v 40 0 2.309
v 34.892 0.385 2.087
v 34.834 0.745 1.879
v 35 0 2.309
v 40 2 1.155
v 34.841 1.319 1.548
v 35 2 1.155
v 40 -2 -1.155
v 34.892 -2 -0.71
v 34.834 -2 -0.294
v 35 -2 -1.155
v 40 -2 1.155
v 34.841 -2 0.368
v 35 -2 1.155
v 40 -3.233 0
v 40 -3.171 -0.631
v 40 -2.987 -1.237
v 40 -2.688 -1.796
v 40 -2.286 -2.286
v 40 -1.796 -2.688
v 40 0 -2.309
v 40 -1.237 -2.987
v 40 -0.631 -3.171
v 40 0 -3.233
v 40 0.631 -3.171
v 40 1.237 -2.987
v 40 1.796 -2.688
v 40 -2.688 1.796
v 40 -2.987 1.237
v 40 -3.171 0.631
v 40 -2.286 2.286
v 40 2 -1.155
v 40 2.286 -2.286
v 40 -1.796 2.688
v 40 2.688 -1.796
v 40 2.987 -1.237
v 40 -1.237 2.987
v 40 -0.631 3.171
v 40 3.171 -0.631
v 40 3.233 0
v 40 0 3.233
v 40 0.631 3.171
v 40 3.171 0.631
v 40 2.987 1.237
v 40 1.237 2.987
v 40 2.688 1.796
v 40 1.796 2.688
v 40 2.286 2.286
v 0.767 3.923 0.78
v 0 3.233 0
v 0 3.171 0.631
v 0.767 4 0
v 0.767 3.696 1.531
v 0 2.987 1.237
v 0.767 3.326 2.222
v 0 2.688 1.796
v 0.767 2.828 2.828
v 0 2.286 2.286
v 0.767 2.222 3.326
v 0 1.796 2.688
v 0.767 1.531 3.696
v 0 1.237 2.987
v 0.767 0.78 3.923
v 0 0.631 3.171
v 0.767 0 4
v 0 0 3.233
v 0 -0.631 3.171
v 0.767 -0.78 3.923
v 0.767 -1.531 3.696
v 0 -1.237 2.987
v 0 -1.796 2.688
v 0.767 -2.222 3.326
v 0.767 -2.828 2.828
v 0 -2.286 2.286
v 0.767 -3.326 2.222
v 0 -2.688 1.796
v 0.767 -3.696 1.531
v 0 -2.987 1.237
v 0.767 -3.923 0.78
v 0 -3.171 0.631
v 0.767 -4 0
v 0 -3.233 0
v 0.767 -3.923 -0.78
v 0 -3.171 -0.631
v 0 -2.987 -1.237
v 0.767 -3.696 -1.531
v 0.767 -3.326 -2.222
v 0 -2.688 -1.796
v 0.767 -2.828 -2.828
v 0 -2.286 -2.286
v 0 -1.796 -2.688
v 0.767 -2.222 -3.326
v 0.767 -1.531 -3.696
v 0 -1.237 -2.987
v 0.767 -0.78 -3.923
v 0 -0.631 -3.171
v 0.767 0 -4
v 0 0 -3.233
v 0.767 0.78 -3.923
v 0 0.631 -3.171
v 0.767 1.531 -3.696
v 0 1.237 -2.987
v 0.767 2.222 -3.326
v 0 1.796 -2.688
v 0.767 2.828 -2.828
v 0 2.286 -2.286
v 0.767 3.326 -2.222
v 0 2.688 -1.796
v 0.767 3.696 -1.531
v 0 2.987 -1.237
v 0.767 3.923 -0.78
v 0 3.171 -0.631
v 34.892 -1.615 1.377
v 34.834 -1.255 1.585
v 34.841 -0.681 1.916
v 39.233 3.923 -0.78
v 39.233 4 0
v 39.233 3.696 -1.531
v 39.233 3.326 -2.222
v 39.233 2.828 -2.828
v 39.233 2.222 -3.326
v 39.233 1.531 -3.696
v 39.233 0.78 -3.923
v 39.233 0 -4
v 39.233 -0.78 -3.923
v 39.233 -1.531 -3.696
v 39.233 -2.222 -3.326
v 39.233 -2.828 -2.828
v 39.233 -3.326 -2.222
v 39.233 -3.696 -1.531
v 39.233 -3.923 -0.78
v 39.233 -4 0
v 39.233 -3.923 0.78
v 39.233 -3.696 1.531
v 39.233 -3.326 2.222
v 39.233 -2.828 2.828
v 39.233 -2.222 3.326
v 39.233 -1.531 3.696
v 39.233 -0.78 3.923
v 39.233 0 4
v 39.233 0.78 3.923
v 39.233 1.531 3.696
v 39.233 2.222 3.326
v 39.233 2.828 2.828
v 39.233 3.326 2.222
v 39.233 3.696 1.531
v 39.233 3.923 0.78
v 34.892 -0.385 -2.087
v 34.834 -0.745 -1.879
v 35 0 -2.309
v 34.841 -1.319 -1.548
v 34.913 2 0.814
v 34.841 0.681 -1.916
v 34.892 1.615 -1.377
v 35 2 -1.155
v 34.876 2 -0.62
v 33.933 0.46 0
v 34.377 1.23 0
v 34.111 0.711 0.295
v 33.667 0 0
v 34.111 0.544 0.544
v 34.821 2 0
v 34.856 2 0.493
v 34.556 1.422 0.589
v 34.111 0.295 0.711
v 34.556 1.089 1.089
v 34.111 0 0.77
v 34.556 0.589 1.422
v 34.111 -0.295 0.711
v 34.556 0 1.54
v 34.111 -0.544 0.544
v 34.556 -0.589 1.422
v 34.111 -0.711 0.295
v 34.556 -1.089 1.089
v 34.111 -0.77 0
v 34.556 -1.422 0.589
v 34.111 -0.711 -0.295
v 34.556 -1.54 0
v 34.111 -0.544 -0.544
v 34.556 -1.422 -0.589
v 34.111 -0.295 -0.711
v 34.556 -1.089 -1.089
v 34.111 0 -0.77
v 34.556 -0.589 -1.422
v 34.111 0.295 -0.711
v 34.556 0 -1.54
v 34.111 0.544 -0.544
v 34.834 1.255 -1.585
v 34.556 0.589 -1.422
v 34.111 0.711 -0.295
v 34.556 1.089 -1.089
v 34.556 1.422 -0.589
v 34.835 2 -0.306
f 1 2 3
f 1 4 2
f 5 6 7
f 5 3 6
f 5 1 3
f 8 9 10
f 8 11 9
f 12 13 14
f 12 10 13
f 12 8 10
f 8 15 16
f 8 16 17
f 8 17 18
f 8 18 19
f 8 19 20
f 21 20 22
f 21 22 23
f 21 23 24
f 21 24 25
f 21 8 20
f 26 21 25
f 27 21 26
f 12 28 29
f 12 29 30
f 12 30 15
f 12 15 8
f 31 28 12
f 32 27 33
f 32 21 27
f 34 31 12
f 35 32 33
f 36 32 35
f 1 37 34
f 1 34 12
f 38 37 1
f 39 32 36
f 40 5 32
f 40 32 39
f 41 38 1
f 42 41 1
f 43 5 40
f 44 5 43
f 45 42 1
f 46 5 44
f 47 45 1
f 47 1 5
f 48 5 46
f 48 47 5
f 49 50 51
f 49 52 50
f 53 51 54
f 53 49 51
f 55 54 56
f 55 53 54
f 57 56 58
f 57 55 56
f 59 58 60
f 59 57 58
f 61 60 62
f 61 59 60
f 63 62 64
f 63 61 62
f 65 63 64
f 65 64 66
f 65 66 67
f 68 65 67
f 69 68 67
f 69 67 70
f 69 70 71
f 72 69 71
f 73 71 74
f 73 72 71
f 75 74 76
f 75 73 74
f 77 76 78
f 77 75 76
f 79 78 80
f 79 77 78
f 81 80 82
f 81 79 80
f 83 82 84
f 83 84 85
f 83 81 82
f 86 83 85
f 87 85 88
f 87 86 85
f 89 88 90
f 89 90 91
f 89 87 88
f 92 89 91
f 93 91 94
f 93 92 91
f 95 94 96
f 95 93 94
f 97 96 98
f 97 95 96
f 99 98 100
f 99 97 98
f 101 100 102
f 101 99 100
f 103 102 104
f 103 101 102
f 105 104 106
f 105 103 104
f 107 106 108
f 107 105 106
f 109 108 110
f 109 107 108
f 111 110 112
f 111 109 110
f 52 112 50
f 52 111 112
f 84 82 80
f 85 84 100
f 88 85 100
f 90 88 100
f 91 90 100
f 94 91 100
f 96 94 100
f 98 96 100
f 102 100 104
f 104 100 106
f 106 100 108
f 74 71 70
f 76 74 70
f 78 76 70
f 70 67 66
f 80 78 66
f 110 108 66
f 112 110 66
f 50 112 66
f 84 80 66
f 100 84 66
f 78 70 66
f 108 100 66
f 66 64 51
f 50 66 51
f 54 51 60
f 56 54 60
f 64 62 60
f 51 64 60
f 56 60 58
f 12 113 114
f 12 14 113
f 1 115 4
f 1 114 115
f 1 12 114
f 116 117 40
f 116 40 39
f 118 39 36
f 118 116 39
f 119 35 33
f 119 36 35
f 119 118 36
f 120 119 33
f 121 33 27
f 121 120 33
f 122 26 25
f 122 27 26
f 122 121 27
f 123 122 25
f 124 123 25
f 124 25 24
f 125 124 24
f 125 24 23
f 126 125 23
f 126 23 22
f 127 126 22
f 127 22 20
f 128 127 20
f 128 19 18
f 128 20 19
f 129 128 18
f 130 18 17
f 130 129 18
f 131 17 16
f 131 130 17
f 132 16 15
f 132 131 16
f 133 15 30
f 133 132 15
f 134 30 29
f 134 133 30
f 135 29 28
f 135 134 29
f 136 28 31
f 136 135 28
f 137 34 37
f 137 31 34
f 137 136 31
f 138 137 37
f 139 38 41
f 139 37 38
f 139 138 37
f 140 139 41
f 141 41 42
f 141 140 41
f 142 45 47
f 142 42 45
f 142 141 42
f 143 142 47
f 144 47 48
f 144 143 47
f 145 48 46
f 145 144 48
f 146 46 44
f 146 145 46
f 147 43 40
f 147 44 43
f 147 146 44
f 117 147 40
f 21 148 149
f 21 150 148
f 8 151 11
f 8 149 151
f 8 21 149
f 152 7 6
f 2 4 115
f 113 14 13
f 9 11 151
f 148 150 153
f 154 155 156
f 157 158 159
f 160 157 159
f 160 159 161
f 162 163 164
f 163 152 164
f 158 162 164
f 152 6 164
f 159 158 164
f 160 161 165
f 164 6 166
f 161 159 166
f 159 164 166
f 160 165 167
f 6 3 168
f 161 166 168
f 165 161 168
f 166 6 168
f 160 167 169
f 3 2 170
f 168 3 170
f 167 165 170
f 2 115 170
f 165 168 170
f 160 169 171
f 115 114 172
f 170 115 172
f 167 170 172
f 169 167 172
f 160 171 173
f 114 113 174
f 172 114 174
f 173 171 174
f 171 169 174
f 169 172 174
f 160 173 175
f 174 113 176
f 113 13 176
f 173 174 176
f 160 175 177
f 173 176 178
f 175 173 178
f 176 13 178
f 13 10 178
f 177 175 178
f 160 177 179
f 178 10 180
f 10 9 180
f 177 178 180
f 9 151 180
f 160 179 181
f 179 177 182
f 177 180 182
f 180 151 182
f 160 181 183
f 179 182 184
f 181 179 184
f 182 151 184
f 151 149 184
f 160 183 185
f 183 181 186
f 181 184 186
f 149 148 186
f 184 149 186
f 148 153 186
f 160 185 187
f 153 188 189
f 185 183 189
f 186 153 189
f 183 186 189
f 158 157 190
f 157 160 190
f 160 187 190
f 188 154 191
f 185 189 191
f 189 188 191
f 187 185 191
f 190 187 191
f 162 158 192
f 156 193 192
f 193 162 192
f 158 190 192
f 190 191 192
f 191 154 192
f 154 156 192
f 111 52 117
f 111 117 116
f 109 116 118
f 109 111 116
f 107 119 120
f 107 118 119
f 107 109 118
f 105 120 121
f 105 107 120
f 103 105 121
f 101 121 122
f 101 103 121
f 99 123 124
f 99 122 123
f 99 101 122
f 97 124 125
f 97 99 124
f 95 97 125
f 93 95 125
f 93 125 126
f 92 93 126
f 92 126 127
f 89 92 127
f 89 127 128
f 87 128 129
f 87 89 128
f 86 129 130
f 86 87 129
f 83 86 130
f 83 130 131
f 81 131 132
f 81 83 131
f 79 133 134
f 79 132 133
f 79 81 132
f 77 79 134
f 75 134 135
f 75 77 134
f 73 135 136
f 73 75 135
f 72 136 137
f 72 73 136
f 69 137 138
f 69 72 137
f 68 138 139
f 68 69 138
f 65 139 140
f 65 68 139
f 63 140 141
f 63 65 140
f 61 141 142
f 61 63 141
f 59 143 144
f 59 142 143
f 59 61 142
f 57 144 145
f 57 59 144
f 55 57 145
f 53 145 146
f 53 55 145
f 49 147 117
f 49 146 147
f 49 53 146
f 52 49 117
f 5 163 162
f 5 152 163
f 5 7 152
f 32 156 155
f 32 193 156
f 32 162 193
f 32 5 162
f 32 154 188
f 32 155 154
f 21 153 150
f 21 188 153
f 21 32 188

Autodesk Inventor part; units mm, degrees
ref_plane "YZ Plane" through (0, 0, 0) normal (1, 0, 0) x (0, 1, 0)
ref_plane "XZ Plane" through (0, 0, 0) normal (0, 1, 0) x (-1, 0, 0)
sketch "Sketch1" plane through (0, 0, 0) normal (0, 0, 1) x (1, 0, 0)
  line L0 (0, 0) -> (33.6667, 0)
  line L1 (40, 2.3094) -> (40, 4)
  line L2 (40, 4) -> (0, 4)
  line L3 (40, 2.3094) -> (35, 2.3094)
  line L4 (35, 2.3094) -> (33.6667, 0)
  line L5 (0, -0.8) -> (0, 4.8) projected
  line L6 (0, 4) -> (0, 0)
  dimension "d0" = 5
  dimension "d1" = 60
  dimension "d2" = 8
  dimension "d3" = 4.6188
  dimension "d5" = 40
revolve "Body" add sketch "Sketch1" angle 360 about axis through (0, 0, 0) along (1, 0, 0)
chamfer "Chamfer1" distance 0.7668 angle 45 1 edges at (40, -4, 0) measured on face at (40, 3.3754, -0.5033)
sketch "Sketch2" plane through (40, 0, 0) normal (1, 0, 0) x (0, 0, -1)
  circle A0 centre (0, 0) radius 2.3094 projected
  line L0 (-1.1547, 2) -> (1.1547, 2)
  line L1 (1.1547, 2) -> (2.3094, 0)
  line L2 (2.3094, 0) -> (1.1547, -2)
  line L3 (1.1547, -2) -> (-1.1547, -2)
  line L4 (-1.1547, -2) -> (-2.3094, 0)
  line L5 (-2.3094, 0) -> (-1.1547, 2)
extrude "Slot" add sketch "Sketch2" against normal up to next contours L1 A0 | A0 L2 | L0 A0 | A0 L3 | L5 A0 | A0 L4
thread "Thread" size "M8x1.25" class "6g" standard "ISO Metric profile" length 40
chamfer "Chamfer2" distance 0.7668 angle 45 1 edges at (0, -4, 0) measured on face at (13.0777, 3.9482, -0.6416)
ref_plane "Work Plane1" through (20, 0, 0) normal (0, 0.5, 0.866) x (1, 0, 0)
equation "\"d7\" = -0.5 * GD1 + 0.5 * NND"
equation "\"d8\" = FAWI"
equation "\"d29\" = -0.5 * GD1 + 0.5 * NND"
equation "\"d11\" = NLG"
equation "\"d13\" = -0.5 * GD1 + 0.5 * NND"
equation "\"d14\" = FAWI"
equation "\"d30\" = -0.5 * GD1 + 0.5 * NND"
equation "\"d0\" = INTI"
equation "\"d2\" = NND"
equation "\"d3\" = 1.1547 * SW"
equation "\"d5\" = NLG"
equation "\"NND\" = 8"
equation "\"NLG\" = 40"
equation "\"INTI\" = 5"
equation "\"FAWI\" = 45deg"
equation "\"SW\" = 4"
equation "\"GD1\" = THREADDIA - 1.2269 * PTC"
equation "\"FAWI1\" = 45deg"
equation "\"GUL\" = 0.61345 * PTC"
equation "\"SPD\" = 5.5"
equation "\"SEWI\" = 90deg"
equation "\"TOA\" = 30deg"
equation "\"THREADDIA\" = 8"
equation "\"PTC\" = 1.25"
equation "\"GAL\" = 0.61345 * PTC"
equation "\"E0\" = 1.155 * SW"
properties part number "ISO 4026 - M8 x 40" material "Stainless Steel, 440C"
